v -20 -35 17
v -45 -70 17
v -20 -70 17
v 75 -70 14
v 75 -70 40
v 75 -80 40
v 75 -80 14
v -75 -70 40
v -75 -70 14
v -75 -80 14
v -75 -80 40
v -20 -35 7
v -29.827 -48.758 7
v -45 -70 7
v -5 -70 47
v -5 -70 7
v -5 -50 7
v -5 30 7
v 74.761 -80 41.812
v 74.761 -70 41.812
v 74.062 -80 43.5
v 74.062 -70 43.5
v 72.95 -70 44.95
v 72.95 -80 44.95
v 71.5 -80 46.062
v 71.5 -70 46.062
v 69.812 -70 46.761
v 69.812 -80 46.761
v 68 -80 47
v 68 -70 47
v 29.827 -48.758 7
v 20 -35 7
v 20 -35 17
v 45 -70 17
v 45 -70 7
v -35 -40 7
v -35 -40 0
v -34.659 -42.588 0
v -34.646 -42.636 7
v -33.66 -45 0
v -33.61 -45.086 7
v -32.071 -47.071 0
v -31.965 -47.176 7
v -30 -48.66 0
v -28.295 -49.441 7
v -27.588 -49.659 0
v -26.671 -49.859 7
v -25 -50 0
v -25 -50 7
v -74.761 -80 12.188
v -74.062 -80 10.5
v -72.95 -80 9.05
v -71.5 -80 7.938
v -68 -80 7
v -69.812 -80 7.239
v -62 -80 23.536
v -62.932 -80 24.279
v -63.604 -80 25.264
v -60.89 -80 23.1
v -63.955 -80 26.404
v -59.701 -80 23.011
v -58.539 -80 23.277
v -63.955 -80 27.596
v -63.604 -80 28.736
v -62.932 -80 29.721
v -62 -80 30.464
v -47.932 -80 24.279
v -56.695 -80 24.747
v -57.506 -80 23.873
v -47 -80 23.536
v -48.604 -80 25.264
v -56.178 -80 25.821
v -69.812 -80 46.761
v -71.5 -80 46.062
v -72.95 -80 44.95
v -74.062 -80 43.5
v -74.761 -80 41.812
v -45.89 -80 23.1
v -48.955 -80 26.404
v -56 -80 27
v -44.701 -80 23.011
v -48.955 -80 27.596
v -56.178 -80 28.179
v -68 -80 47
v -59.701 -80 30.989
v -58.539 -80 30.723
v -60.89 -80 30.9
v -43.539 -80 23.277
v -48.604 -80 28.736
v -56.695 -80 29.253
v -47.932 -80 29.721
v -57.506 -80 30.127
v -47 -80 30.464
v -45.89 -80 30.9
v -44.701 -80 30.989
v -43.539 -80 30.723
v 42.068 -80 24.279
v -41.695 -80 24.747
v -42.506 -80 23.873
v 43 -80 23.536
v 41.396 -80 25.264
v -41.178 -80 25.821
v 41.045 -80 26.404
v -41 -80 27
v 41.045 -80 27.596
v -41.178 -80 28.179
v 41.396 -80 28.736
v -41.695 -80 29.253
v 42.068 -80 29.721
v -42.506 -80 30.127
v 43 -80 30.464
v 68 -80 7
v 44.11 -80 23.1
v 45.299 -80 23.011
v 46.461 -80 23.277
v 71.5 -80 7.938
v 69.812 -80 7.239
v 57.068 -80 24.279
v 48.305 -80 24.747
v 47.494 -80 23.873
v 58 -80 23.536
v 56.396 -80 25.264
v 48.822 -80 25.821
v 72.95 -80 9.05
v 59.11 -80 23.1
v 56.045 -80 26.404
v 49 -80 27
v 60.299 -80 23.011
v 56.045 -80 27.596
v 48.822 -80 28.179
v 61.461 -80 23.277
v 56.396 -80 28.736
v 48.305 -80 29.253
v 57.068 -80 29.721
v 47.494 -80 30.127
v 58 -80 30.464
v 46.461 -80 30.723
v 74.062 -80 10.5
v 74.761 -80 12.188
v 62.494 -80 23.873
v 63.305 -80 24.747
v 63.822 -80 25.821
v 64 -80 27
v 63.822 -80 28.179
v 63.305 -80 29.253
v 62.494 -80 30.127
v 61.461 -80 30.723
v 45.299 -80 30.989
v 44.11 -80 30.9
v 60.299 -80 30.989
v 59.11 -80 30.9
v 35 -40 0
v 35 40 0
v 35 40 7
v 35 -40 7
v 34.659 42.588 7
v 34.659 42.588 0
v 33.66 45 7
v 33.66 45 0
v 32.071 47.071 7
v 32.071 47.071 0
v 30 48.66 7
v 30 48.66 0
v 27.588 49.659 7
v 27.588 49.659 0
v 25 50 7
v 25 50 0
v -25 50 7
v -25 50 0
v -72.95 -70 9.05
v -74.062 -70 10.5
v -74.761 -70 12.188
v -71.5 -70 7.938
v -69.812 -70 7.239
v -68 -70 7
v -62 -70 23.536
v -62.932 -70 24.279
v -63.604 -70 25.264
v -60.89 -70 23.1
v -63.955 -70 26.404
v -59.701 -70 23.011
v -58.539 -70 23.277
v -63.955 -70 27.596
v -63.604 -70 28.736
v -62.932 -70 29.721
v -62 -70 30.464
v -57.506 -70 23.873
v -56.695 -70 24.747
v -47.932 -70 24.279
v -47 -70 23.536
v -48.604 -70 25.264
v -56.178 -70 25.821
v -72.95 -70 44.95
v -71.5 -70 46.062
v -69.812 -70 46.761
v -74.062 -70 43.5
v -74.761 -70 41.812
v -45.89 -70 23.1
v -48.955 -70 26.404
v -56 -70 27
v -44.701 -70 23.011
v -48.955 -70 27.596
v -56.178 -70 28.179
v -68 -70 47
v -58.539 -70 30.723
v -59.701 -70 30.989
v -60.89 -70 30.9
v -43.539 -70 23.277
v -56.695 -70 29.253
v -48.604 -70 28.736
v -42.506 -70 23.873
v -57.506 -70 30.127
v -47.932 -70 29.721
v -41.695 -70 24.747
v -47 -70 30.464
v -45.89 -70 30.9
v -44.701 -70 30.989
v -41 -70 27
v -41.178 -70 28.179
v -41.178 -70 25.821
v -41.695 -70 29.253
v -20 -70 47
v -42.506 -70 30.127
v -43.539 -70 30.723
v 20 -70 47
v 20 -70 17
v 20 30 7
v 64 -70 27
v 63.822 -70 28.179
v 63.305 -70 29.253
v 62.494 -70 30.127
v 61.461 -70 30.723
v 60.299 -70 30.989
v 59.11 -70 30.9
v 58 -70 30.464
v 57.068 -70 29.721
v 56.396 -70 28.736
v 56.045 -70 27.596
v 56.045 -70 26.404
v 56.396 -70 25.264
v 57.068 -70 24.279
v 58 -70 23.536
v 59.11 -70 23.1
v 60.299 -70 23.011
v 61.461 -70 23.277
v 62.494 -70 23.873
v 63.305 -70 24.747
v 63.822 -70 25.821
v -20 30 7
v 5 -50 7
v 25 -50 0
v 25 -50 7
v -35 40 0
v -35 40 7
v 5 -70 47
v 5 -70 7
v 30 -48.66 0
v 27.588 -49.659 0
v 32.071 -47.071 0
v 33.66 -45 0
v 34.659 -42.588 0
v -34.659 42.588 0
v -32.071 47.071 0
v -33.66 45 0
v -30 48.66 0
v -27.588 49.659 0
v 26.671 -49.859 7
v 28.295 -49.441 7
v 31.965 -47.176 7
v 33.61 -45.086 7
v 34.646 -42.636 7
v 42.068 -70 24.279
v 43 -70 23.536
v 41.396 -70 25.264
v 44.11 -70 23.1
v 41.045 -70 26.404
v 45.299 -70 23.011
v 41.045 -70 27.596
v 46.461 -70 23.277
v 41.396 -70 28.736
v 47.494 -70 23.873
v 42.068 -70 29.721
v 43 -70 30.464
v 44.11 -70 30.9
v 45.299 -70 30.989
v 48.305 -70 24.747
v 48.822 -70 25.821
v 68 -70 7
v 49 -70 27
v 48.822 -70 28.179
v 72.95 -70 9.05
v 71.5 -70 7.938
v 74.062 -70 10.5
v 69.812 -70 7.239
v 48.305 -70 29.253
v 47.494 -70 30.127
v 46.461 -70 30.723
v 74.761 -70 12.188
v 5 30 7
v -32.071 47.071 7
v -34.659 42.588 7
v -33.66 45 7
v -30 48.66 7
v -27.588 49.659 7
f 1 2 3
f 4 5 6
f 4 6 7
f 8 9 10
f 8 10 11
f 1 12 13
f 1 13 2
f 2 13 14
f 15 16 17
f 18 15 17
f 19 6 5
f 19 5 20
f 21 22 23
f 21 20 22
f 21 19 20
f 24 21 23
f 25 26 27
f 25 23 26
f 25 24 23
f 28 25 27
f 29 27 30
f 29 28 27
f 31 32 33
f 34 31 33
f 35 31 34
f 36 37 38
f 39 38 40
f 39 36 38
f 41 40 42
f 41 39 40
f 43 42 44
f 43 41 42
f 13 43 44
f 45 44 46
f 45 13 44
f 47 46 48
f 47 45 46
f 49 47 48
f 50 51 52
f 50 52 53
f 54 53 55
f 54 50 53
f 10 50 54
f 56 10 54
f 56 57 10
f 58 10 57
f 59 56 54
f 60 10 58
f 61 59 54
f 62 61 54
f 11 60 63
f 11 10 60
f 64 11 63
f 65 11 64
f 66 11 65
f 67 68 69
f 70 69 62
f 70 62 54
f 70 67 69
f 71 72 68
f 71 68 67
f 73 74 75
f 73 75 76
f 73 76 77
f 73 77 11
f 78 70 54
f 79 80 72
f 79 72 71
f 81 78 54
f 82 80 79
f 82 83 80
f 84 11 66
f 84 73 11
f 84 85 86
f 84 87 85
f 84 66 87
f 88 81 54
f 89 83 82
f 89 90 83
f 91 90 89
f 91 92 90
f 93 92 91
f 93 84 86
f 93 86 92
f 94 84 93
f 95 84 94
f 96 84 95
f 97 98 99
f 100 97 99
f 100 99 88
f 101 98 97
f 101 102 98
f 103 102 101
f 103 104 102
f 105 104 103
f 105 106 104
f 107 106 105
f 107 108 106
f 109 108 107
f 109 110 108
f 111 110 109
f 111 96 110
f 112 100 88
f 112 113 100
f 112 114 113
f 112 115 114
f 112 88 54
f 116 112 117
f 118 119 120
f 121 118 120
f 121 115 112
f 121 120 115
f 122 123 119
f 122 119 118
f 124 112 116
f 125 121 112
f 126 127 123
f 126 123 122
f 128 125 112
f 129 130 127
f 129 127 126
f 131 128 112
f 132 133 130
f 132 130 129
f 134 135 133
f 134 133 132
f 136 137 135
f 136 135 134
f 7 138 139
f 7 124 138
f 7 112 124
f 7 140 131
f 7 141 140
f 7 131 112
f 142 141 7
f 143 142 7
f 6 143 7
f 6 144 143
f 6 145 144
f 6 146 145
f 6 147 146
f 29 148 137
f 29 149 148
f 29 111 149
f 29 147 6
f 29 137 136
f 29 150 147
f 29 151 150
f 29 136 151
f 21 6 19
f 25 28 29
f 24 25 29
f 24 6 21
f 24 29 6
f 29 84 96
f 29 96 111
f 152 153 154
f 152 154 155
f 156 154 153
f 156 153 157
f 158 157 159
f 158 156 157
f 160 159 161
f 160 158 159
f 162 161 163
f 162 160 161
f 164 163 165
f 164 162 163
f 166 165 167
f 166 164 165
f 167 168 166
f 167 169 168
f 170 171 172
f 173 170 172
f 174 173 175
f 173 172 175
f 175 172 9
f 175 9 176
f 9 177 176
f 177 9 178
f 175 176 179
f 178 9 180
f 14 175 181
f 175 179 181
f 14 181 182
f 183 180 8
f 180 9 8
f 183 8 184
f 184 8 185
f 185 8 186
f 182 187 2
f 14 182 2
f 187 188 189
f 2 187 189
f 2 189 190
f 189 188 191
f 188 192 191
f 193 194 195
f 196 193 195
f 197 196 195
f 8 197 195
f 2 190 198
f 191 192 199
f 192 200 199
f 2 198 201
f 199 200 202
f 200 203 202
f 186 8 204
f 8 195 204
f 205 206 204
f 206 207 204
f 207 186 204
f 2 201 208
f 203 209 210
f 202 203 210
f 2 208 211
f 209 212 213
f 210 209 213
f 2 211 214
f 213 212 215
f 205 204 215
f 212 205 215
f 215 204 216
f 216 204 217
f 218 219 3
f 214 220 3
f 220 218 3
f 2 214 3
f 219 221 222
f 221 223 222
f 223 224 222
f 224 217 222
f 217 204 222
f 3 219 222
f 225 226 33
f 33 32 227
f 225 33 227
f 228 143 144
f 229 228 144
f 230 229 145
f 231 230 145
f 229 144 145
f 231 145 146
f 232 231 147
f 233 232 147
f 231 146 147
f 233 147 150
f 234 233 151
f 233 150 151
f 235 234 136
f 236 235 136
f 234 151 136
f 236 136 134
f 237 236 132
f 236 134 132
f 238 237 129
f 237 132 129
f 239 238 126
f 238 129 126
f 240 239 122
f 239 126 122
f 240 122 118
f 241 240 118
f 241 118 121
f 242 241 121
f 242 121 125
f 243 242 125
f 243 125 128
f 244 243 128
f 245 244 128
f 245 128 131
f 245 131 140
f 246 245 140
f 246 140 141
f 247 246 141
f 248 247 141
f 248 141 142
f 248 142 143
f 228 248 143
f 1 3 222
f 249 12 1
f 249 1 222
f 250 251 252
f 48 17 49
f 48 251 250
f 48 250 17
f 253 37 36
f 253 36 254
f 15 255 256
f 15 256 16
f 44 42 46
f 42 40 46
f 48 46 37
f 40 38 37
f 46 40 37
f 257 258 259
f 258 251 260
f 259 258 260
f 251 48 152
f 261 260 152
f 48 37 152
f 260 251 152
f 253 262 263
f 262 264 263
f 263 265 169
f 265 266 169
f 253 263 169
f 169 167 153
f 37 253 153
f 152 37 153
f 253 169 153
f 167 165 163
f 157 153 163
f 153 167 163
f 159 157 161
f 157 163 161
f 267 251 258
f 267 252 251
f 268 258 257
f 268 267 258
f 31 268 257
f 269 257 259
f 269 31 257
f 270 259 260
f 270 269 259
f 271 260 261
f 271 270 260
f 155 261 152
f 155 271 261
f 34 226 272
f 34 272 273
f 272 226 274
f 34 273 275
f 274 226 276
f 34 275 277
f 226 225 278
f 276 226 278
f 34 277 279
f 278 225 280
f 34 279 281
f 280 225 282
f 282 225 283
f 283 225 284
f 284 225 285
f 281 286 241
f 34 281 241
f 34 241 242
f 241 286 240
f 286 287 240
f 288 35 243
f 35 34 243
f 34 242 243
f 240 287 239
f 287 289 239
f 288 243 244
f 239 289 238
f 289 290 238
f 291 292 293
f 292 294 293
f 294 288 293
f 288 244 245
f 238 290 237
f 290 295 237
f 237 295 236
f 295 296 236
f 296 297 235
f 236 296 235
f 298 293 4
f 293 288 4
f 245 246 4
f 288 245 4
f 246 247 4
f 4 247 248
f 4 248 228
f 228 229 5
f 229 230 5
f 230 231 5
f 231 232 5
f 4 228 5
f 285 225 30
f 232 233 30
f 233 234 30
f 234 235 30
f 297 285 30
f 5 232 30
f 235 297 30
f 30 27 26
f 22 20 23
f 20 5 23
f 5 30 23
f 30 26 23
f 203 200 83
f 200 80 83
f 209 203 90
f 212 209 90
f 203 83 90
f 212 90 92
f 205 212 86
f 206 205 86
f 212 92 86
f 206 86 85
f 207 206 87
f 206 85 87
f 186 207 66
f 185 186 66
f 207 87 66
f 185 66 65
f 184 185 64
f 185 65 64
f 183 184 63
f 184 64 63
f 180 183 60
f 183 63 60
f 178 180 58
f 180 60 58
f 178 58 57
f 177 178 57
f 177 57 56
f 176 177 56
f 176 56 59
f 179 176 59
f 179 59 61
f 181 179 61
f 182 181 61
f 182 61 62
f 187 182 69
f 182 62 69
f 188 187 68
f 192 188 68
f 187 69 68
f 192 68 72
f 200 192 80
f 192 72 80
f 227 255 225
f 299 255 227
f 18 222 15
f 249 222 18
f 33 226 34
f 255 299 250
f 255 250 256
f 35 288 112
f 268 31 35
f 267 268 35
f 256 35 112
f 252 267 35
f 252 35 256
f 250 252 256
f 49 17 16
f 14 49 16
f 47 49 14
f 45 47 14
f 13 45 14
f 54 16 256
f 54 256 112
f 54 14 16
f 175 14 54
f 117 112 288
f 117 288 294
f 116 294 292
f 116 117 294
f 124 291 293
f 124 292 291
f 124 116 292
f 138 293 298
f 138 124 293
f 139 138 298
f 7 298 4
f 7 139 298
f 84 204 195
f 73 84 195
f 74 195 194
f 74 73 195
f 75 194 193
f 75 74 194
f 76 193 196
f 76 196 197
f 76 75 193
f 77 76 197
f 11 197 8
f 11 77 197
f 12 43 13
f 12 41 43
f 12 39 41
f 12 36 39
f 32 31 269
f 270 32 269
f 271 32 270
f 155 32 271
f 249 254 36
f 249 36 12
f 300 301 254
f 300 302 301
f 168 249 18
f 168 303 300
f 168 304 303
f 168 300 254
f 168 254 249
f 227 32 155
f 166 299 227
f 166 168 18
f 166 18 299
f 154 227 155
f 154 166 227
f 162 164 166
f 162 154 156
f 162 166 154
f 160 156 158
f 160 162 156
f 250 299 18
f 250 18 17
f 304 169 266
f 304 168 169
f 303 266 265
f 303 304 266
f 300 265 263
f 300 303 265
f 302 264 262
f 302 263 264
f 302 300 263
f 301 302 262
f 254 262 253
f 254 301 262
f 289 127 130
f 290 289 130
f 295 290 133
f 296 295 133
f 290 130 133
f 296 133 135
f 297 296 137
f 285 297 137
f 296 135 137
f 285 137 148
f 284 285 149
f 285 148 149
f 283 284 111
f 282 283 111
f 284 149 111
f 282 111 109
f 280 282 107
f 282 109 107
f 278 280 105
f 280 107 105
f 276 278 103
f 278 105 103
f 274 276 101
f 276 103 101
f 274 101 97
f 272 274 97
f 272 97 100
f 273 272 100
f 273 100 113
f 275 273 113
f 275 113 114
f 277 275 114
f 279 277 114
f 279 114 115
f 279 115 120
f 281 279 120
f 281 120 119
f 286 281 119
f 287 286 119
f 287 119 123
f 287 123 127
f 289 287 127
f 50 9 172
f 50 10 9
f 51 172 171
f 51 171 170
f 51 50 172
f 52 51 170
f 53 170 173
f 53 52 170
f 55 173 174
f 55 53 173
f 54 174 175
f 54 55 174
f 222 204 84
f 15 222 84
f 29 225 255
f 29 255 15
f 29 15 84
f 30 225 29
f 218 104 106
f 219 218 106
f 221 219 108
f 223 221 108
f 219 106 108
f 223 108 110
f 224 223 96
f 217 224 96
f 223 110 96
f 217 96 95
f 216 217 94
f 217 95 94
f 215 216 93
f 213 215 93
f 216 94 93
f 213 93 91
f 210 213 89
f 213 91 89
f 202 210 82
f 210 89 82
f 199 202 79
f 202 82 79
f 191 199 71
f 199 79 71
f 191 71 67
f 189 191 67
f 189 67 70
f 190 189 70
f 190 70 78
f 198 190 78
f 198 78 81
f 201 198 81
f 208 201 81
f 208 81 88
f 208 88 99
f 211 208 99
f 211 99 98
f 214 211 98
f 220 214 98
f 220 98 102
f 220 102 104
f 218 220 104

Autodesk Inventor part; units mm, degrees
ref_plane "YZ Plane" through (0, 0, 0) normal (1, 0, 0) x (0, 1, 0)
ref_plane "XZ Plane" through (0, 0, 0) normal (0, 1, 0) x (-1, 0, 0)
sketch "Sketch1" plane through (0, 0, 0) normal (0, 0, 1) x (1, 0, 0)
  line L0 (35, -50) -> (-35, -50)
  line L1 (-35, -50) -> (-35, 50)
  line L2 (-35, 50) -> (35, 50)
  line L3 (35, 50) -> (35, -50)
  line L4 (35, -50) -> (-35, 50) construction
  line L5 (-35, -50) -> (35, 50) construction
  point P0 (0, 0)
  dimension "d0" = 70
  dimension "d1" = 100
extrude "Extrusion1" add sketch "Sketch1" along normal blind 7
fillet "Fillet1" radius 10 4 edges at (35, 50, 3.5) (-35, 50, 3.5) (-35, -50, 3.5) (35, -50, 3.5)
ref_plane "Work Plane1" through (-20, -40, 0) normal (-1, 0, 0) x (0, 0, 1)
sketch "Sketch2" plane through (-20, -40, 0) normal (-1, 0, 0) x (0, 0, 1)
  line L0 (7, 80) -> (7, 90) construction
  line L1 (7, 90) -> (0, 90) construction
  line L2 (0, 90) -> (0, 80) construction
  line L3 (0, 80) -> (7, 80) construction
  line L4 (7, 0) -> (0, 0) construction
  line L5 (7, 80) -> (7, 0) construction
  line L6 (0, 80) -> (7, 80) construction
  line L7 (0, 0) -> (0, 80) construction
  line L8 (7, -10) -> (7, 0) construction
  line L9 (7, 0) -> (0, 0) construction
  line L10 (0, 0) -> (0, -10) construction
  line L11 (0, -10) -> (7, -10) construction
  line L12 (0, -10) -> (7, -10) construction
  line L13 (57, 70) -> (7, 70) construction
  line L14 (7, 70) -> (7, -10) construction
  line L15 (7, 70) -> (47, 70) construction
  line L16 (47, 70) -> (47, -30) construction
  line L17 (47, -30) -> (7, -30) construction
  line L18 (7, -30) -> (7, 70) construction
  line L19 (7, 70) -> (7, -30)
  line L20 (7, -30) -> (47, -30)
  line L21 (47, -30) -> (7, 70)
  line L22 (0, 0) -> (7, 0) construction
  line L23 (0, 80) -> (0, 0) construction
  line L24 (7, 80) -> (0, 80) construction
  line L25 (7, 0) -> (7, 80) construction
  line L26 (7, 90) -> (7, 80) construction
  line L27 (7, 80) -> (0, 80) construction
  line L28 (0, 80) -> (0, 90) construction
  line L29 (0, 90) -> (7, 90) construction
  line L30 (7, 0) -> (7, -10) construction
  line L31 (7, -10) -> (0, -10) construction
  line L32 (0, -10) -> (0, 0) construction
  line L33 (0, 0) -> (7, 0) construction
  point P0 (0, 40)
  dimension "d6" = 50
  dimension "d8" = 40
  dimension "d9" = 100
  dimension "d17" = 20
extrude "Extrusion2" add sketch "Sketch2" against normal blind 40
sketch "Sketch3" plane through (-20, -70, 7) normal (0, -1, 0) x (1, 0, 0)
  line L0 (0, 0) -> (0, 40) construction
  line L1 (0, 0) -> (40, 0) construction
  line L2 (40, 40) -> (40, 0) construction
  line L3 (0, 40) -> (40, 40) construction
  line L4 (0, 40) -> (-55, 40) construction
  line L5 (-55, 40) -> (95, 40)
  line L6 (95, 40) -> (95, 0)
  line L7 (95, 0) -> (-55, 0)
  line L8 (-55, 0) -> (-55, 40)
  point P0 (20, -7)
  dimension "d12" = 55
  dimension "d13" = 150
  dimension "d18" = 40
extrude "Extrusion3" add sketch "Sketch3" along normal blind 10
fillet "Fillet2" radius 7 4 edges at (-75, -75, 47) (75, -75, 47) (75, -75, 7) (-75, -75, 7)
sketch "Sketch5" plane through (-20, -80, 7) normal (0, -1, 0) x (1, 0, 0)
  arc A0 (-55, 7) -> (-48, 0) centre (-48, 7) ccw construction
  line L0 (-48, 0) -> (88, 0) construction
  arc A1 (88, 0) -> (95, 7) centre (88, 7) ccw construction
  line L1 (95, 7) -> (95, 33) construction
  arc A2 (95, 33) -> (88, 40) centre (88, 33) ccw construction
  line L2 (88, 40) -> (-48, 40) construction
  arc A3 (-48, 40) -> (-55, 33) centre (-48, 33) ccw construction
  line L3 (-55, 33) -> (-55, 7) construction
  line L4 (95, 20) -> (-55, 20) construction
  line L5 (-55, 7) -> (-55, 33) construction
  line L6 (0, 0) -> (40, 0) construction
  line L7 (20, 0) -> (20, 40) construction
  circle A4 centre (80, 20) radius 4
  circle A5 centre (-40, 20) radius 4
  circle A6 centre (65, 20) radius 4
  circle A7 centre (-25, 20) radius 4
  point P0 (20, -7)
  dimension "d23" = 8
  dimension "d24" = 8
  dimension "d25" = 15
  dimension "d26" = 15
  dimension "d29" = 8
  dimension "d30" = 8
  dimension "d31" = 15
  dimension "d32" = 15
extrude "Extrusion4" cut sketch "Sketch5" against normal blind 20
sketch "Sketch7" plane through (-20, -70, 47) normal (0, 0, 1) x (1, 0, 0)
  line L0 (0, 0) -> (0, 100) construction
  line L1 (0, 0) -> (40, 0) construction
  line L2 (40, 100) -> (40, 0) construction
  line L3 (0, 100) -> (40, 100) construction
  line L4 (20, 100) -> (20, 0) construction
  line L5 (0, 20) -> (0, 100) construction
  line L6 (0, 50) -> (20, 50) construction
  line L7 (25, 0) -> (15, 0)
  line L8 (15, 0) -> (15, 100)
  line L9 (15, 100) -> (25, 100)
  line L10 (25, 100) -> (25, 0)
  line L11 (25, 0) -> (15, 100) construction
  line L12 (15, 0) -> (25, 100) construction
  point P0 (20, 70)
  dimension "d33" = 10
extrude "Extrusion5" cut sketch "Sketch7" against normal blind 40
sketch "Sketch8" plane through (0, 0, 7) normal (0, 0, 1) x (1, 0, 0)
  line L0 (-20, -50) -> (-20, 30) construction
  line L1 (-20, 30) -> (-5, 30) construction
  line L2 (-5, -50) -> (-5, 30) construction
  line L3 (-5, -50) -> (5, -50) construction
  line L4 (5, 30) -> (5, -50) construction
  line L5 (5, 30) -> (20, 30) construction
  line L6 (20, 30) -> (20, -50) construction
  line L7 (20, -50) -> (25, -50) construction
  arc A0 (25, -50) -> (35, -40) centre (25, -40) ccw construction
  line L8 (35, -40) -> (35, 40) construction
  arc A1 (35, 40) -> (25, 50) centre (25, 40) ccw construction
  line L9 (25, 50) -> (-25, 50) construction
  arc A2 (-25, 50) -> (-35, 40) centre (-25, 40) ccw construction
  line L10 (-35, 40) -> (-35, -40) construction
  arc A3 (-35, -40) -> (-25, -50) centre (-25, -40) ccw construction
  line L11 (-25, -50) -> (-20, -50) construction
  line L12 (-5, -70) -> (-5, 30) construction
  line L13 (-20, 30) -> (-5, 30) construction
  line L14 (-20, -70) -> (-20, 30) construction
  line L15 (-20, -70) -> (-5, -70) construction
  line L16 (5, 30) -> (5, -70) construction
  line L17 (5, -70) -> (20, -70) construction
  line L18 (20, 30) -> (20, -70) construction
  line L19 (5, 30) -> (20, 30) construction
  line L20 (68, -70) -> (68, -80) construction
  line L21 (20, -70) -> (68, -70) construction
  line L22 (5, -70) -> (20, -70) construction
  line L23 (-5, -70) -> (5, -70) construction
  line L24 (-20, -70) -> (-5, -70) construction
  line L25 (-68, -70) -> (-20, -70) construction
  line L26 (-68, -80) -> (-68, -70) construction
  line L27 (68, -80) -> (-68, -80) construction
  line L28 (-20, -70) -> (-45, -70)
  line L29 (-20, -70) -> (-20, -35)
  line L30 (-20, -35) -> (-45, -70)
  line L31 (25, -50) -> (-25, -50) construction
  line L32 (0, -50) -> (0, -70) construction
  line L33 (20, -70) -> (45, -70)
  line L34 (20, -70) -> (20, -35)
  line L35 (20, -35) -> (45, -70)
  point P0 (0, 0)
  dimension "d0" = 70
  dimension "d36" = 25
  dimension "d37" = 35
extrude "Extrusion6" add sketch "Sketch8" along normal blind 10
properties part number "Mordaza"
